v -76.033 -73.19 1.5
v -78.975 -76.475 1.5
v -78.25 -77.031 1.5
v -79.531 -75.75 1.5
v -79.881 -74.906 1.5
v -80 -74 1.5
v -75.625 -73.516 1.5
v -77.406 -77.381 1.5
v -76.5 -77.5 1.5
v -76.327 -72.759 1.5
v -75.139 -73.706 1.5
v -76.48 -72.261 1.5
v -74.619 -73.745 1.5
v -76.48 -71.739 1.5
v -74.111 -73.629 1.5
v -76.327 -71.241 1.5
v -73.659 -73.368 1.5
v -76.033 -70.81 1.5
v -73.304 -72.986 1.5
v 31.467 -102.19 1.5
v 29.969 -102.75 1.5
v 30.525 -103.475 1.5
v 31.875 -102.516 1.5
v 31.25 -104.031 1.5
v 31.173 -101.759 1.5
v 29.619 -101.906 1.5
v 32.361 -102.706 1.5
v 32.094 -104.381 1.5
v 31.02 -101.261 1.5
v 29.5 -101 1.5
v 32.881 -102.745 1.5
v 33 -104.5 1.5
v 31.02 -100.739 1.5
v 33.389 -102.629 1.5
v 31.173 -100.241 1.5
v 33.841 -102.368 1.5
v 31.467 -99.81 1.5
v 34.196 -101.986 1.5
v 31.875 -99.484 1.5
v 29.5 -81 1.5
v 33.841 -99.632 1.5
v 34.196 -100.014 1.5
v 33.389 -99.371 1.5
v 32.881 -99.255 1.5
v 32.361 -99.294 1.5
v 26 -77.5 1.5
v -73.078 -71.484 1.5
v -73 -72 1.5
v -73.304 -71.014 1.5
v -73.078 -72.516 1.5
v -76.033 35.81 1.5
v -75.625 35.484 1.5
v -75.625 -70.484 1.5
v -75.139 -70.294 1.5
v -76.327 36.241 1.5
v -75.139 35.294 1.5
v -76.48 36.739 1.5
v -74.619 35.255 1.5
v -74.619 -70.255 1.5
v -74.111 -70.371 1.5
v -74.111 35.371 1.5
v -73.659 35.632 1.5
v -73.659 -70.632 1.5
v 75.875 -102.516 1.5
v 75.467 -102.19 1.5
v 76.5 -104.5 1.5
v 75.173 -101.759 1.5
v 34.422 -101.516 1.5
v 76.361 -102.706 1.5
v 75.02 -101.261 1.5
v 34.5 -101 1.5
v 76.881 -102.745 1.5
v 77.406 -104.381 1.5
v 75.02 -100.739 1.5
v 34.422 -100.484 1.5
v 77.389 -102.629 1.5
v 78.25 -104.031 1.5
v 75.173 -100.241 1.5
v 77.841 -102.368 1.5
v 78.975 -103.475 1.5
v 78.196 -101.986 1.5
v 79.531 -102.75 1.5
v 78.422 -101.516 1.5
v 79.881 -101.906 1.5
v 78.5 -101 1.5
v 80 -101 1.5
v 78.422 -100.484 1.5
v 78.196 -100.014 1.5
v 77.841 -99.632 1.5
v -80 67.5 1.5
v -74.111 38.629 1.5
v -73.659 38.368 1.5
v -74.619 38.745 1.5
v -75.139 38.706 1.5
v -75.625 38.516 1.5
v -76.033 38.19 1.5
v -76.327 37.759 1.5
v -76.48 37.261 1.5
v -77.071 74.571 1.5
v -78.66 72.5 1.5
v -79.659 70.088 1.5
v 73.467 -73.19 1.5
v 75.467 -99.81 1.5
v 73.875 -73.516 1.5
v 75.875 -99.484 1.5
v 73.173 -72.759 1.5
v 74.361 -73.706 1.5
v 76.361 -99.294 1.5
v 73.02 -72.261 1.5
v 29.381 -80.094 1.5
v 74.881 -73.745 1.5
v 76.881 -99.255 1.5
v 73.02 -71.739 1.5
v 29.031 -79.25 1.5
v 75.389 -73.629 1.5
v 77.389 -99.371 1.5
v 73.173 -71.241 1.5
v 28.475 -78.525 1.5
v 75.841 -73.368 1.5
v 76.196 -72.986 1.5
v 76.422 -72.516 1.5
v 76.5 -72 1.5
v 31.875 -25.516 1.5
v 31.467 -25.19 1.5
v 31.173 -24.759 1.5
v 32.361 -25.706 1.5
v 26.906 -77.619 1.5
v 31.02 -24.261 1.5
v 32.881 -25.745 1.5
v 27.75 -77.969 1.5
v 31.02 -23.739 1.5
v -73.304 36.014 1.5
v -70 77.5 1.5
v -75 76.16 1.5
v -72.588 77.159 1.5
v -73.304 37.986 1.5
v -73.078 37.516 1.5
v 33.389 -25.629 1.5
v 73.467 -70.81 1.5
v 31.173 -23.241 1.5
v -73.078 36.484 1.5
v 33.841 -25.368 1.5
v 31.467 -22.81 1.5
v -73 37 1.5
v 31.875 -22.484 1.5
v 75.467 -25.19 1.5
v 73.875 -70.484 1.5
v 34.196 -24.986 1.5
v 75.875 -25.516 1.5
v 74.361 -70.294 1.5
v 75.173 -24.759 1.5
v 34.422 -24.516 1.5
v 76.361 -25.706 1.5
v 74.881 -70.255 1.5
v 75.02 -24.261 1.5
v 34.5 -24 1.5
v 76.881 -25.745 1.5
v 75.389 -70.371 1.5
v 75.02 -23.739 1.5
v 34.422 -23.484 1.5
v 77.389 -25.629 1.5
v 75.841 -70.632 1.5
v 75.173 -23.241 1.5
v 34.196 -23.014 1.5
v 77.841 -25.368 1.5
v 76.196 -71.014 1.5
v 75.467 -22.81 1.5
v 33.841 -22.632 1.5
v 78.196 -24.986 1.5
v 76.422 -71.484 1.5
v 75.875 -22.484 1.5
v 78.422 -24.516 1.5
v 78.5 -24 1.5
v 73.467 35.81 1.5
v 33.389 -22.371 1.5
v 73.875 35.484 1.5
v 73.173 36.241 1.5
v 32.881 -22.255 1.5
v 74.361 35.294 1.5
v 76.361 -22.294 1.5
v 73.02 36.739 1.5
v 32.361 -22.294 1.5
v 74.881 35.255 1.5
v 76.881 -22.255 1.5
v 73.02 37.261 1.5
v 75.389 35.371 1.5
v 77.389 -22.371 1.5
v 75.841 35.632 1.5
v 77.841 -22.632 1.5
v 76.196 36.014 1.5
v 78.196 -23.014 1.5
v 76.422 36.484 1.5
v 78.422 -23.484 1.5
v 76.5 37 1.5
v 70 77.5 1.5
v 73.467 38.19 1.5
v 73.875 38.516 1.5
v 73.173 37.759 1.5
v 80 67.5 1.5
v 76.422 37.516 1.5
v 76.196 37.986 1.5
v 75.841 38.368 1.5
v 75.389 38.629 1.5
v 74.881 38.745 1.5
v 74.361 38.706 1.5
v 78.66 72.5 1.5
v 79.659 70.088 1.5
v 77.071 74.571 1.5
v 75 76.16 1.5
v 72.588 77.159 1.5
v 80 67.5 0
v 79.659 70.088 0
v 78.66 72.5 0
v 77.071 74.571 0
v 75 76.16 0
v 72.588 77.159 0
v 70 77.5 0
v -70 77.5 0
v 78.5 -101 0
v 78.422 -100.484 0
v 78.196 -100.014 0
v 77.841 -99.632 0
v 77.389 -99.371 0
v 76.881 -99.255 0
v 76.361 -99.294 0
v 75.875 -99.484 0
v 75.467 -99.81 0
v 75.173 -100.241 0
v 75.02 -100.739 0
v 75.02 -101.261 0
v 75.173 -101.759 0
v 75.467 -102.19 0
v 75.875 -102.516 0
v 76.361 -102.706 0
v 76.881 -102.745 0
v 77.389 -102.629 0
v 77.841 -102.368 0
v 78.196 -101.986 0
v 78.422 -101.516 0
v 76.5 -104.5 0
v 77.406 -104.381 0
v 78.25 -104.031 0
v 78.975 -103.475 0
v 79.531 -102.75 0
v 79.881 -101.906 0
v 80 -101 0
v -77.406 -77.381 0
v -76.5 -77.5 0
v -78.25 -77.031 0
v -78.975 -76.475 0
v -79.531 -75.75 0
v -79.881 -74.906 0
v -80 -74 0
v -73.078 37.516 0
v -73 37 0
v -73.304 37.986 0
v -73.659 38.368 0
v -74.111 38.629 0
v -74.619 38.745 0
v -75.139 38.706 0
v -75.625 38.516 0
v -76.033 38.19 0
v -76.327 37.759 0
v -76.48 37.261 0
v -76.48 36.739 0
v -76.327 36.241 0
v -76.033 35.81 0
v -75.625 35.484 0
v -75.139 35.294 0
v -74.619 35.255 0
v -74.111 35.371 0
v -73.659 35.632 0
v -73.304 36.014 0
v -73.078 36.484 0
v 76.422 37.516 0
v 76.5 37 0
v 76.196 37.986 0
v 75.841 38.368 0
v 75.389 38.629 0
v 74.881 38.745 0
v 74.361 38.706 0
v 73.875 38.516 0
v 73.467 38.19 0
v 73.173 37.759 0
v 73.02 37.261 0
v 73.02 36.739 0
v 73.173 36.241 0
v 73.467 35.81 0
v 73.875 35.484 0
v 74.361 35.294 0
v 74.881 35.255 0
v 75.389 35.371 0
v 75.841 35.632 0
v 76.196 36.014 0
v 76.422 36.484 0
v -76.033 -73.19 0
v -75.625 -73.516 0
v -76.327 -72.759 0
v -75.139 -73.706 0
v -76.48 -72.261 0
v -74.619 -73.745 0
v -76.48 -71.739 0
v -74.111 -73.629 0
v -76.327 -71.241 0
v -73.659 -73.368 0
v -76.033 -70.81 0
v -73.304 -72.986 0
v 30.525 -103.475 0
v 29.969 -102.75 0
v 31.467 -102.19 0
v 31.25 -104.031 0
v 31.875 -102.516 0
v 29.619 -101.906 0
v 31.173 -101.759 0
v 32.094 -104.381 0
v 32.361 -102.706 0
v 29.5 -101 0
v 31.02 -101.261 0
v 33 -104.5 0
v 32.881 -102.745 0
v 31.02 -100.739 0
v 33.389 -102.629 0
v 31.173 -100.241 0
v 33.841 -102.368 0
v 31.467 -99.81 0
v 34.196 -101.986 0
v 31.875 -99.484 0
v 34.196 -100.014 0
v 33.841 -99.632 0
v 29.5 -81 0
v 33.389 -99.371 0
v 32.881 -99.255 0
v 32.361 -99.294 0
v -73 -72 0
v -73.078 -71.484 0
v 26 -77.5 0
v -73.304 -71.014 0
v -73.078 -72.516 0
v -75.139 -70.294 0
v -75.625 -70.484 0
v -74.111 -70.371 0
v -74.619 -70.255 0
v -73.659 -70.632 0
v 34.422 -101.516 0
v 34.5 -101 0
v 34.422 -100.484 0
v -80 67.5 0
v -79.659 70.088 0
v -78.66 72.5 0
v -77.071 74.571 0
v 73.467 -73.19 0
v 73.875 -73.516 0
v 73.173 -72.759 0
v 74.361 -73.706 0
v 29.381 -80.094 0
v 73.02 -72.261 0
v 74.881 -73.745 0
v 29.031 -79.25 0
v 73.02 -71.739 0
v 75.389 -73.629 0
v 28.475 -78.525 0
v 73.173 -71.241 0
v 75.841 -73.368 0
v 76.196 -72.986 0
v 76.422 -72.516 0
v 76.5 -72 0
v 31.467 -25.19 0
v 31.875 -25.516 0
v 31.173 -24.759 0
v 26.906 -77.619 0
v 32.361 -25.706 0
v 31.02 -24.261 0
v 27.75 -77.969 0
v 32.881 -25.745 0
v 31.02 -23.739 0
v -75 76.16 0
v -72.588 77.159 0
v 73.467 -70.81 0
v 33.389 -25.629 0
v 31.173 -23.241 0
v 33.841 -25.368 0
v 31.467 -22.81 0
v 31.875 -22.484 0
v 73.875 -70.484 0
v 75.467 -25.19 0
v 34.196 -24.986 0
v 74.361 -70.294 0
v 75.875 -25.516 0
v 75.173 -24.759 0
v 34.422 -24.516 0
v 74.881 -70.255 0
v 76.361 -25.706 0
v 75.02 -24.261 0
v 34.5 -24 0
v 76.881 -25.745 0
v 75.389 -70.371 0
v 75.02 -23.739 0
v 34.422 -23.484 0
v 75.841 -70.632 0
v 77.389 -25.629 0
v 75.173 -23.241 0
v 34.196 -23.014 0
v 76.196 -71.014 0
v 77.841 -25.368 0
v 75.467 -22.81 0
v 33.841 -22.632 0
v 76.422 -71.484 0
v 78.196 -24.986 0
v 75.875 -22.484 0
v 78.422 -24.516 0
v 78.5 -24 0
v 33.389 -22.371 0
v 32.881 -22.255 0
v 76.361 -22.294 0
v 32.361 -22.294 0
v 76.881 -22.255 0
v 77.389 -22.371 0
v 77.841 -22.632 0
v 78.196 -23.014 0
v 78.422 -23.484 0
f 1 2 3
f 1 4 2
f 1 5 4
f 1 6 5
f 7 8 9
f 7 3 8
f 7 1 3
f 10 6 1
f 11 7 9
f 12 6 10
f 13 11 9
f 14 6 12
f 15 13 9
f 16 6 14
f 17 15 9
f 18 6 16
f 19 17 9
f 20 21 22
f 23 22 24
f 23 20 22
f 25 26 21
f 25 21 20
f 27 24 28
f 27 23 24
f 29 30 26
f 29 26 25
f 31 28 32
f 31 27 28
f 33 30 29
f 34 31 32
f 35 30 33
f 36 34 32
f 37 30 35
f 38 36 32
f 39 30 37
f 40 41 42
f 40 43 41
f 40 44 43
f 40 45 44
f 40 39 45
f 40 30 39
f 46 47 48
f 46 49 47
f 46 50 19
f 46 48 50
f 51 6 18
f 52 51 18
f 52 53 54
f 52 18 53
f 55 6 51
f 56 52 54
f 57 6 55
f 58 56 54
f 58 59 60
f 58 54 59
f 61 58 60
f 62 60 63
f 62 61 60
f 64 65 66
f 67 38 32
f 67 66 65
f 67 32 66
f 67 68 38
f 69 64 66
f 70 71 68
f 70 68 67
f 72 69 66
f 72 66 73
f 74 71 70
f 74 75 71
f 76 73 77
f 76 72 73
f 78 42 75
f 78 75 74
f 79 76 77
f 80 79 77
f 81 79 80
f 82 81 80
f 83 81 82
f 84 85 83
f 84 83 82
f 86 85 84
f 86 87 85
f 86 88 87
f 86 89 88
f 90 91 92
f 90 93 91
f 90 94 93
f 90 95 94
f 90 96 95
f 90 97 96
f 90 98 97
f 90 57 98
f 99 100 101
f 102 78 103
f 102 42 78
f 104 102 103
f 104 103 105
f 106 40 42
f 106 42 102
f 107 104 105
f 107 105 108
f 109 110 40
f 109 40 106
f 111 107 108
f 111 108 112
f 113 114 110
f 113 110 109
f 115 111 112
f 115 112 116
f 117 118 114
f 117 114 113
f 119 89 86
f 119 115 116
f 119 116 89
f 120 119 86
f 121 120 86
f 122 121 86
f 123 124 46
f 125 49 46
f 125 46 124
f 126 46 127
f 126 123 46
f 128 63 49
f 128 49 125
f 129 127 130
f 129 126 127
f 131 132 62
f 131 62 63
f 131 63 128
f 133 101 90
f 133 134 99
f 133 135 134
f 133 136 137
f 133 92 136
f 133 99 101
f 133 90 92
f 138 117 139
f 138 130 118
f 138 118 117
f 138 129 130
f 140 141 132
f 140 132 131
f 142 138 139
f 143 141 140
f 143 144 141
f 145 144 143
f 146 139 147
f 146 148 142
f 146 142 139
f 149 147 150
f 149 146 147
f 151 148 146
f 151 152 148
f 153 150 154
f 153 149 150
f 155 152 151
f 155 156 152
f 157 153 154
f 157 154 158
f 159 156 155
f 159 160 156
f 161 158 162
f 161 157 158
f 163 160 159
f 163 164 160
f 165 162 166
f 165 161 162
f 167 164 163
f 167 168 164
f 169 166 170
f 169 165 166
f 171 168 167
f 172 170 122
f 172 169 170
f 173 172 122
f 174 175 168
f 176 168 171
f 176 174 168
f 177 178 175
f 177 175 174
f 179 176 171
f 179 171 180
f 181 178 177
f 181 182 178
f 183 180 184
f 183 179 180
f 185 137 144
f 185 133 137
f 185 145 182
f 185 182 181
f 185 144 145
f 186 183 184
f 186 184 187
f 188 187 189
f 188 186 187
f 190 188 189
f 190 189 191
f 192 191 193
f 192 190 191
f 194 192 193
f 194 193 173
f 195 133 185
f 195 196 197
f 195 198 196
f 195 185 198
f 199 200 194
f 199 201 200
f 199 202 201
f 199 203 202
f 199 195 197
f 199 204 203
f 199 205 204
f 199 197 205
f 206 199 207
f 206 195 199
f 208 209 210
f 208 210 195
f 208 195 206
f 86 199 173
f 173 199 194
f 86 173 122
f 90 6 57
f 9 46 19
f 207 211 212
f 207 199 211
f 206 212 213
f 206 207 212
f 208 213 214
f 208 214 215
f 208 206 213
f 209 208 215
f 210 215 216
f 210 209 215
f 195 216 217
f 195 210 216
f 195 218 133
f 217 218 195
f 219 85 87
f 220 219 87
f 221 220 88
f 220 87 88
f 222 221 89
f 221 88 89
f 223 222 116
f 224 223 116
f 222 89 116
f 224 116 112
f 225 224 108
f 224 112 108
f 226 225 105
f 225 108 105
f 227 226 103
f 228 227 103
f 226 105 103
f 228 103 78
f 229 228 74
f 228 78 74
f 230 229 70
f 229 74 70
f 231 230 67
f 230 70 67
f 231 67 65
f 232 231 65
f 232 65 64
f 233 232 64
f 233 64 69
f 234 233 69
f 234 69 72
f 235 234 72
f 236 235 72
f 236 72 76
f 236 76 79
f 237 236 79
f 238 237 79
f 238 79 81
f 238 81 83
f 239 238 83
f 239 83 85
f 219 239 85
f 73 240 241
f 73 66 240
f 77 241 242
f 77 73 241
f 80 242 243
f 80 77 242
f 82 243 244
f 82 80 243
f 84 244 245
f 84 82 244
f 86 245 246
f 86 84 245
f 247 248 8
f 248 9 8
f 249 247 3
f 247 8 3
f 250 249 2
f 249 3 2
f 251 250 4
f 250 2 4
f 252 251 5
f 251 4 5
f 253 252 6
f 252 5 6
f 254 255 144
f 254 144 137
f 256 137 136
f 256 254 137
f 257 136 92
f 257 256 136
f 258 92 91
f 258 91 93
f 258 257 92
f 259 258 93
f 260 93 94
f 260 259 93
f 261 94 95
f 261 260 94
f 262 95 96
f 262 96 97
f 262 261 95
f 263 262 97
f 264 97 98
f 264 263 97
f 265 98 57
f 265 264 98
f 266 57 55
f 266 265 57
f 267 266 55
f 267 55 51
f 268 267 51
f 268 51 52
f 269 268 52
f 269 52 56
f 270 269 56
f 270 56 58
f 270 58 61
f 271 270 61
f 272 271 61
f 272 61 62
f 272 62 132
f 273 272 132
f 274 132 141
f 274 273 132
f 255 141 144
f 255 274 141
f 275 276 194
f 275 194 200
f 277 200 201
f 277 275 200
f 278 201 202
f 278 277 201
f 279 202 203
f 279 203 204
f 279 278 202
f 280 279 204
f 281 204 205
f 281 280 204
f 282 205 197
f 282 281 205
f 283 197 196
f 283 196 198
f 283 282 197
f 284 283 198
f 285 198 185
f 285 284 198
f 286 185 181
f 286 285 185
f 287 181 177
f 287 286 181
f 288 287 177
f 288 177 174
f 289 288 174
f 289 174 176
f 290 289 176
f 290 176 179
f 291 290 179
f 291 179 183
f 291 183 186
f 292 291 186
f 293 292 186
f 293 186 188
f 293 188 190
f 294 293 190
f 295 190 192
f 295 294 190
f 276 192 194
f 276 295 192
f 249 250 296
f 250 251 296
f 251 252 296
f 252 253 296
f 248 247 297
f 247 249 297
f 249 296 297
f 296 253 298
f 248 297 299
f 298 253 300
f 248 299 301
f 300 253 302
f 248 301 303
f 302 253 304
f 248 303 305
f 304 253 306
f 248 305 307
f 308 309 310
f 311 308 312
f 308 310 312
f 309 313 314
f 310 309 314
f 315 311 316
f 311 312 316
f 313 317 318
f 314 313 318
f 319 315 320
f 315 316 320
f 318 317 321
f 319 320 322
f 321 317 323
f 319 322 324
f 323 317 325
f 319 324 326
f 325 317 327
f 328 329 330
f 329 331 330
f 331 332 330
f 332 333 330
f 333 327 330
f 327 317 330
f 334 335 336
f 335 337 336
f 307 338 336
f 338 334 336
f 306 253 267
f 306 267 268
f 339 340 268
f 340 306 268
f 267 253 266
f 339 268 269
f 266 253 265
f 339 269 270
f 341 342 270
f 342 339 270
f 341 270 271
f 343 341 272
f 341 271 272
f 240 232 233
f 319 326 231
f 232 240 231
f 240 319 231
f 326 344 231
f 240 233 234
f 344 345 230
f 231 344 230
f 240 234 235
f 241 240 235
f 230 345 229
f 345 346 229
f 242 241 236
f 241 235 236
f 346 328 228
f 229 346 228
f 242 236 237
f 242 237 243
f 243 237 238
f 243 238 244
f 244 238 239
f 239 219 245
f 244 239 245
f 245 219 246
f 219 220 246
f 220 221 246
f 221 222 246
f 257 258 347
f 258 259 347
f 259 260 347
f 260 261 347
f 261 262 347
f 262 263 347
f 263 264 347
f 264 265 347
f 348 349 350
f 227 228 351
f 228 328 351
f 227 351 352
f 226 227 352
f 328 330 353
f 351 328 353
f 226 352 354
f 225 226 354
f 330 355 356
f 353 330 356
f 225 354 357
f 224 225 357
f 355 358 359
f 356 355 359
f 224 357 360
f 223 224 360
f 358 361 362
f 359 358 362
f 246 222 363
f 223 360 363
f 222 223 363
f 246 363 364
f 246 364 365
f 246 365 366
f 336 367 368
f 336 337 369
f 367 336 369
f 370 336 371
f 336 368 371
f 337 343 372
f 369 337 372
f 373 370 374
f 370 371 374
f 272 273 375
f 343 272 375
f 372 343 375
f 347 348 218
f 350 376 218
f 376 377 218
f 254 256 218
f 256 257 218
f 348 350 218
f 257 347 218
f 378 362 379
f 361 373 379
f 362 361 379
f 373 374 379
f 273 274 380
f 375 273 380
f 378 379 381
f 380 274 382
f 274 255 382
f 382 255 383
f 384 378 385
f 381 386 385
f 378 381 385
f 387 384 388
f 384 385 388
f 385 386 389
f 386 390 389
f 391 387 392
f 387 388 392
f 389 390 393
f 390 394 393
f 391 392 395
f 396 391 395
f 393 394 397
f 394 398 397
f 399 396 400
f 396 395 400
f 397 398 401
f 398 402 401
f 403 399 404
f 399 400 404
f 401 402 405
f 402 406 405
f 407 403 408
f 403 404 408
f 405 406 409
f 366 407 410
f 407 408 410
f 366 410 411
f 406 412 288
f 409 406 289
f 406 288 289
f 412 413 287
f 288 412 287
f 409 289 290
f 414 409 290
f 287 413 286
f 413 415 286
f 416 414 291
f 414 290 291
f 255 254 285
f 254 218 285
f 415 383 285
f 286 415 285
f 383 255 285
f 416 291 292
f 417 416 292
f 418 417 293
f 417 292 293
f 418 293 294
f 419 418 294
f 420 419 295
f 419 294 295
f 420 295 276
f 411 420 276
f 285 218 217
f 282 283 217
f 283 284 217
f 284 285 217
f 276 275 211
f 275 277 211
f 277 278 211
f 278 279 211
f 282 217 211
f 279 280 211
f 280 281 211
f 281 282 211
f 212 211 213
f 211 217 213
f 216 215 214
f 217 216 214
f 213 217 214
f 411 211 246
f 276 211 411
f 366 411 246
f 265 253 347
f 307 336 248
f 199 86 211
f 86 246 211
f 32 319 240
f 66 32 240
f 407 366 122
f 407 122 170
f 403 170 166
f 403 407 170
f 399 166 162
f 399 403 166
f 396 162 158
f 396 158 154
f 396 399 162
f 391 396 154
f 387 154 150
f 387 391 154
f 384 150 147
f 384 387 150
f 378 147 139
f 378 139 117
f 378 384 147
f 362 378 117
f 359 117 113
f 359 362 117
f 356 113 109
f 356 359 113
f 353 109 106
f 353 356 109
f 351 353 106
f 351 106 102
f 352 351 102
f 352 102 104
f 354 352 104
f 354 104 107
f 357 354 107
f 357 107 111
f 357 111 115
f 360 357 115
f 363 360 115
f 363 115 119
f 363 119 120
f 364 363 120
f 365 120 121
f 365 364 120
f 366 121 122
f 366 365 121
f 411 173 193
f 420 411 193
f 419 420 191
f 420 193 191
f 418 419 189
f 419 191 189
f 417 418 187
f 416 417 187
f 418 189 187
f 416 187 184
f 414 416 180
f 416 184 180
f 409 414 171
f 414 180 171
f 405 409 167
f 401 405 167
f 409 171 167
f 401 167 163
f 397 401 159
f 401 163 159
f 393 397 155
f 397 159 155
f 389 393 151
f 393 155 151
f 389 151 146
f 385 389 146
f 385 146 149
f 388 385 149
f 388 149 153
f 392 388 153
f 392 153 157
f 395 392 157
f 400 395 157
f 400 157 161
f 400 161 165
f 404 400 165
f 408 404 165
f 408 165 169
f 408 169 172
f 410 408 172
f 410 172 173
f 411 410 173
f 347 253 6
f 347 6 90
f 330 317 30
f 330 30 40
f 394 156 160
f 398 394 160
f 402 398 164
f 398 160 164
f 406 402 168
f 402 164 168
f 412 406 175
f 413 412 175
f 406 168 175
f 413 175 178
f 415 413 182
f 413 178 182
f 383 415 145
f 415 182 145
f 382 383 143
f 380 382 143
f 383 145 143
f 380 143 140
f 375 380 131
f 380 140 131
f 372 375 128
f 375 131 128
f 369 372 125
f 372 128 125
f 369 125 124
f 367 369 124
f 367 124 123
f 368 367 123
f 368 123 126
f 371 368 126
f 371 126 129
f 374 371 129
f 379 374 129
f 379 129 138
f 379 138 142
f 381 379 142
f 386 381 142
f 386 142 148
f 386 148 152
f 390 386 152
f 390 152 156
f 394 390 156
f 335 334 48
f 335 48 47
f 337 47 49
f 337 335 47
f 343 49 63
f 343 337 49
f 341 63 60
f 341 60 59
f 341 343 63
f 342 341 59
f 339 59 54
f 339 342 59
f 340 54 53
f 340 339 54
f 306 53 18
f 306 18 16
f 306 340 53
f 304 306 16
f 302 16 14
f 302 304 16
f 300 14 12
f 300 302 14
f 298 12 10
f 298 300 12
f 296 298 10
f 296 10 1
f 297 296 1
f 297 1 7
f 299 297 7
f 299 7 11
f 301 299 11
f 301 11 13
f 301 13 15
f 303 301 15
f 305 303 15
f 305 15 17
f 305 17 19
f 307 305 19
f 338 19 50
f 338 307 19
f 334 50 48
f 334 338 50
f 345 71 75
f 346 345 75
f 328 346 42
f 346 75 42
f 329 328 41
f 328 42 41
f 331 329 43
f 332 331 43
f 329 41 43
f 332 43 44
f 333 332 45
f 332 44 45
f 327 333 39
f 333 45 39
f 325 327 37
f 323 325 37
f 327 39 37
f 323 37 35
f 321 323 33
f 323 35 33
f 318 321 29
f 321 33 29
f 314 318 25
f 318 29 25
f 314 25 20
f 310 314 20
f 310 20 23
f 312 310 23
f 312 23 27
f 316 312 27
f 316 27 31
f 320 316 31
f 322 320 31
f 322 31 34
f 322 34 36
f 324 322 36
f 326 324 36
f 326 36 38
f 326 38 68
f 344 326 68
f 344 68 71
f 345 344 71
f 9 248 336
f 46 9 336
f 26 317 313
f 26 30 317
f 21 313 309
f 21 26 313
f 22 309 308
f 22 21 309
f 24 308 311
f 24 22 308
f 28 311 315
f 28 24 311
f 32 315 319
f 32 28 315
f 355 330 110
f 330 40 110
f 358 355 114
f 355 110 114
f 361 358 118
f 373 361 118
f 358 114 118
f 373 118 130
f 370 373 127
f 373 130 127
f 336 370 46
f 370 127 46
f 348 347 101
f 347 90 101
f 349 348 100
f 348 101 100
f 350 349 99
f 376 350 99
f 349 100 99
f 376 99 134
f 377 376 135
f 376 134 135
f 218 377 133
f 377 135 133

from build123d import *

# Parameters (mm, degrees)
F0_W     = 160
F0_H     = 155
F0_R     = 1.75
F1_DEPTH = 1.5
F2_W     = 50.5
F2_H     = 27
F3_DEPTH = 1.5
F4_R     = 1.75
F5_DEPTH = 25
F6_R     = 3.5
F7_R     = 10


with BuildPart() as f1:
    # F0 (on Top) → F1 (new body)
    with BuildSketch(Plane.XY):
        Rectangle(F0_W, F0_H)
        with Locations((-74.75, -72)):
            Circle(F0_R, mode=Mode.SUBTRACT)
        with Locations((74.75, -72)):
            Circle(F0_R, mode=Mode.SUBTRACT)
        with Locations((-74.75, 37)):
            Circle(F0_R, mode=Mode.SUBTRACT)
        with Locations((74.75, 37)):
            Circle(F0_R, mode=Mode.SUBTRACT)
    extrude(amount=F1_DEPTH)

    # F2 (on Top) → F3 (join)
    with BuildSketch(Plane.XY):
        with Locations((54.75, -91)):
            Rectangle(F2_W, F2_H)
    extrude(amount=F3_DEPTH)

    # F4 (on face) → F5 (cut)
    with BuildSketch(Plane.XY.offset(1.5)):
        with Locations((76.75, -101)):
            Circle(F4_R)
        with Locations((32.75, -101)):
            Circle(F4_R)
        with Locations((32.75, -24)):
            Circle(F4_R)
        with Locations((76.75, -24)):
            Circle(F4_R)
    extrude(amount=-F5_DEPTH, mode=Mode.SUBTRACT)

    # F6
    f6_edges = [f1.edges().sort_by_distance(p)[0] for p in [
        (80, -104.5, 0.75),
        (29.5, -104.5, 0.75),
        (29.5, -77.5, 0.75),
        (-80, -77.5, 0.75),
    ]]
    fillet(f6_edges, radius=F6_R)

    # F7
    f7_edges = [f1.edges().sort_by_distance(p)[0] for p in [
        (80, 77.5, 0.75),
        (-80, 77.5, 0.75),
    ]]
    fillet(f7_edges, radius=F7_R)


solid = f1.part
